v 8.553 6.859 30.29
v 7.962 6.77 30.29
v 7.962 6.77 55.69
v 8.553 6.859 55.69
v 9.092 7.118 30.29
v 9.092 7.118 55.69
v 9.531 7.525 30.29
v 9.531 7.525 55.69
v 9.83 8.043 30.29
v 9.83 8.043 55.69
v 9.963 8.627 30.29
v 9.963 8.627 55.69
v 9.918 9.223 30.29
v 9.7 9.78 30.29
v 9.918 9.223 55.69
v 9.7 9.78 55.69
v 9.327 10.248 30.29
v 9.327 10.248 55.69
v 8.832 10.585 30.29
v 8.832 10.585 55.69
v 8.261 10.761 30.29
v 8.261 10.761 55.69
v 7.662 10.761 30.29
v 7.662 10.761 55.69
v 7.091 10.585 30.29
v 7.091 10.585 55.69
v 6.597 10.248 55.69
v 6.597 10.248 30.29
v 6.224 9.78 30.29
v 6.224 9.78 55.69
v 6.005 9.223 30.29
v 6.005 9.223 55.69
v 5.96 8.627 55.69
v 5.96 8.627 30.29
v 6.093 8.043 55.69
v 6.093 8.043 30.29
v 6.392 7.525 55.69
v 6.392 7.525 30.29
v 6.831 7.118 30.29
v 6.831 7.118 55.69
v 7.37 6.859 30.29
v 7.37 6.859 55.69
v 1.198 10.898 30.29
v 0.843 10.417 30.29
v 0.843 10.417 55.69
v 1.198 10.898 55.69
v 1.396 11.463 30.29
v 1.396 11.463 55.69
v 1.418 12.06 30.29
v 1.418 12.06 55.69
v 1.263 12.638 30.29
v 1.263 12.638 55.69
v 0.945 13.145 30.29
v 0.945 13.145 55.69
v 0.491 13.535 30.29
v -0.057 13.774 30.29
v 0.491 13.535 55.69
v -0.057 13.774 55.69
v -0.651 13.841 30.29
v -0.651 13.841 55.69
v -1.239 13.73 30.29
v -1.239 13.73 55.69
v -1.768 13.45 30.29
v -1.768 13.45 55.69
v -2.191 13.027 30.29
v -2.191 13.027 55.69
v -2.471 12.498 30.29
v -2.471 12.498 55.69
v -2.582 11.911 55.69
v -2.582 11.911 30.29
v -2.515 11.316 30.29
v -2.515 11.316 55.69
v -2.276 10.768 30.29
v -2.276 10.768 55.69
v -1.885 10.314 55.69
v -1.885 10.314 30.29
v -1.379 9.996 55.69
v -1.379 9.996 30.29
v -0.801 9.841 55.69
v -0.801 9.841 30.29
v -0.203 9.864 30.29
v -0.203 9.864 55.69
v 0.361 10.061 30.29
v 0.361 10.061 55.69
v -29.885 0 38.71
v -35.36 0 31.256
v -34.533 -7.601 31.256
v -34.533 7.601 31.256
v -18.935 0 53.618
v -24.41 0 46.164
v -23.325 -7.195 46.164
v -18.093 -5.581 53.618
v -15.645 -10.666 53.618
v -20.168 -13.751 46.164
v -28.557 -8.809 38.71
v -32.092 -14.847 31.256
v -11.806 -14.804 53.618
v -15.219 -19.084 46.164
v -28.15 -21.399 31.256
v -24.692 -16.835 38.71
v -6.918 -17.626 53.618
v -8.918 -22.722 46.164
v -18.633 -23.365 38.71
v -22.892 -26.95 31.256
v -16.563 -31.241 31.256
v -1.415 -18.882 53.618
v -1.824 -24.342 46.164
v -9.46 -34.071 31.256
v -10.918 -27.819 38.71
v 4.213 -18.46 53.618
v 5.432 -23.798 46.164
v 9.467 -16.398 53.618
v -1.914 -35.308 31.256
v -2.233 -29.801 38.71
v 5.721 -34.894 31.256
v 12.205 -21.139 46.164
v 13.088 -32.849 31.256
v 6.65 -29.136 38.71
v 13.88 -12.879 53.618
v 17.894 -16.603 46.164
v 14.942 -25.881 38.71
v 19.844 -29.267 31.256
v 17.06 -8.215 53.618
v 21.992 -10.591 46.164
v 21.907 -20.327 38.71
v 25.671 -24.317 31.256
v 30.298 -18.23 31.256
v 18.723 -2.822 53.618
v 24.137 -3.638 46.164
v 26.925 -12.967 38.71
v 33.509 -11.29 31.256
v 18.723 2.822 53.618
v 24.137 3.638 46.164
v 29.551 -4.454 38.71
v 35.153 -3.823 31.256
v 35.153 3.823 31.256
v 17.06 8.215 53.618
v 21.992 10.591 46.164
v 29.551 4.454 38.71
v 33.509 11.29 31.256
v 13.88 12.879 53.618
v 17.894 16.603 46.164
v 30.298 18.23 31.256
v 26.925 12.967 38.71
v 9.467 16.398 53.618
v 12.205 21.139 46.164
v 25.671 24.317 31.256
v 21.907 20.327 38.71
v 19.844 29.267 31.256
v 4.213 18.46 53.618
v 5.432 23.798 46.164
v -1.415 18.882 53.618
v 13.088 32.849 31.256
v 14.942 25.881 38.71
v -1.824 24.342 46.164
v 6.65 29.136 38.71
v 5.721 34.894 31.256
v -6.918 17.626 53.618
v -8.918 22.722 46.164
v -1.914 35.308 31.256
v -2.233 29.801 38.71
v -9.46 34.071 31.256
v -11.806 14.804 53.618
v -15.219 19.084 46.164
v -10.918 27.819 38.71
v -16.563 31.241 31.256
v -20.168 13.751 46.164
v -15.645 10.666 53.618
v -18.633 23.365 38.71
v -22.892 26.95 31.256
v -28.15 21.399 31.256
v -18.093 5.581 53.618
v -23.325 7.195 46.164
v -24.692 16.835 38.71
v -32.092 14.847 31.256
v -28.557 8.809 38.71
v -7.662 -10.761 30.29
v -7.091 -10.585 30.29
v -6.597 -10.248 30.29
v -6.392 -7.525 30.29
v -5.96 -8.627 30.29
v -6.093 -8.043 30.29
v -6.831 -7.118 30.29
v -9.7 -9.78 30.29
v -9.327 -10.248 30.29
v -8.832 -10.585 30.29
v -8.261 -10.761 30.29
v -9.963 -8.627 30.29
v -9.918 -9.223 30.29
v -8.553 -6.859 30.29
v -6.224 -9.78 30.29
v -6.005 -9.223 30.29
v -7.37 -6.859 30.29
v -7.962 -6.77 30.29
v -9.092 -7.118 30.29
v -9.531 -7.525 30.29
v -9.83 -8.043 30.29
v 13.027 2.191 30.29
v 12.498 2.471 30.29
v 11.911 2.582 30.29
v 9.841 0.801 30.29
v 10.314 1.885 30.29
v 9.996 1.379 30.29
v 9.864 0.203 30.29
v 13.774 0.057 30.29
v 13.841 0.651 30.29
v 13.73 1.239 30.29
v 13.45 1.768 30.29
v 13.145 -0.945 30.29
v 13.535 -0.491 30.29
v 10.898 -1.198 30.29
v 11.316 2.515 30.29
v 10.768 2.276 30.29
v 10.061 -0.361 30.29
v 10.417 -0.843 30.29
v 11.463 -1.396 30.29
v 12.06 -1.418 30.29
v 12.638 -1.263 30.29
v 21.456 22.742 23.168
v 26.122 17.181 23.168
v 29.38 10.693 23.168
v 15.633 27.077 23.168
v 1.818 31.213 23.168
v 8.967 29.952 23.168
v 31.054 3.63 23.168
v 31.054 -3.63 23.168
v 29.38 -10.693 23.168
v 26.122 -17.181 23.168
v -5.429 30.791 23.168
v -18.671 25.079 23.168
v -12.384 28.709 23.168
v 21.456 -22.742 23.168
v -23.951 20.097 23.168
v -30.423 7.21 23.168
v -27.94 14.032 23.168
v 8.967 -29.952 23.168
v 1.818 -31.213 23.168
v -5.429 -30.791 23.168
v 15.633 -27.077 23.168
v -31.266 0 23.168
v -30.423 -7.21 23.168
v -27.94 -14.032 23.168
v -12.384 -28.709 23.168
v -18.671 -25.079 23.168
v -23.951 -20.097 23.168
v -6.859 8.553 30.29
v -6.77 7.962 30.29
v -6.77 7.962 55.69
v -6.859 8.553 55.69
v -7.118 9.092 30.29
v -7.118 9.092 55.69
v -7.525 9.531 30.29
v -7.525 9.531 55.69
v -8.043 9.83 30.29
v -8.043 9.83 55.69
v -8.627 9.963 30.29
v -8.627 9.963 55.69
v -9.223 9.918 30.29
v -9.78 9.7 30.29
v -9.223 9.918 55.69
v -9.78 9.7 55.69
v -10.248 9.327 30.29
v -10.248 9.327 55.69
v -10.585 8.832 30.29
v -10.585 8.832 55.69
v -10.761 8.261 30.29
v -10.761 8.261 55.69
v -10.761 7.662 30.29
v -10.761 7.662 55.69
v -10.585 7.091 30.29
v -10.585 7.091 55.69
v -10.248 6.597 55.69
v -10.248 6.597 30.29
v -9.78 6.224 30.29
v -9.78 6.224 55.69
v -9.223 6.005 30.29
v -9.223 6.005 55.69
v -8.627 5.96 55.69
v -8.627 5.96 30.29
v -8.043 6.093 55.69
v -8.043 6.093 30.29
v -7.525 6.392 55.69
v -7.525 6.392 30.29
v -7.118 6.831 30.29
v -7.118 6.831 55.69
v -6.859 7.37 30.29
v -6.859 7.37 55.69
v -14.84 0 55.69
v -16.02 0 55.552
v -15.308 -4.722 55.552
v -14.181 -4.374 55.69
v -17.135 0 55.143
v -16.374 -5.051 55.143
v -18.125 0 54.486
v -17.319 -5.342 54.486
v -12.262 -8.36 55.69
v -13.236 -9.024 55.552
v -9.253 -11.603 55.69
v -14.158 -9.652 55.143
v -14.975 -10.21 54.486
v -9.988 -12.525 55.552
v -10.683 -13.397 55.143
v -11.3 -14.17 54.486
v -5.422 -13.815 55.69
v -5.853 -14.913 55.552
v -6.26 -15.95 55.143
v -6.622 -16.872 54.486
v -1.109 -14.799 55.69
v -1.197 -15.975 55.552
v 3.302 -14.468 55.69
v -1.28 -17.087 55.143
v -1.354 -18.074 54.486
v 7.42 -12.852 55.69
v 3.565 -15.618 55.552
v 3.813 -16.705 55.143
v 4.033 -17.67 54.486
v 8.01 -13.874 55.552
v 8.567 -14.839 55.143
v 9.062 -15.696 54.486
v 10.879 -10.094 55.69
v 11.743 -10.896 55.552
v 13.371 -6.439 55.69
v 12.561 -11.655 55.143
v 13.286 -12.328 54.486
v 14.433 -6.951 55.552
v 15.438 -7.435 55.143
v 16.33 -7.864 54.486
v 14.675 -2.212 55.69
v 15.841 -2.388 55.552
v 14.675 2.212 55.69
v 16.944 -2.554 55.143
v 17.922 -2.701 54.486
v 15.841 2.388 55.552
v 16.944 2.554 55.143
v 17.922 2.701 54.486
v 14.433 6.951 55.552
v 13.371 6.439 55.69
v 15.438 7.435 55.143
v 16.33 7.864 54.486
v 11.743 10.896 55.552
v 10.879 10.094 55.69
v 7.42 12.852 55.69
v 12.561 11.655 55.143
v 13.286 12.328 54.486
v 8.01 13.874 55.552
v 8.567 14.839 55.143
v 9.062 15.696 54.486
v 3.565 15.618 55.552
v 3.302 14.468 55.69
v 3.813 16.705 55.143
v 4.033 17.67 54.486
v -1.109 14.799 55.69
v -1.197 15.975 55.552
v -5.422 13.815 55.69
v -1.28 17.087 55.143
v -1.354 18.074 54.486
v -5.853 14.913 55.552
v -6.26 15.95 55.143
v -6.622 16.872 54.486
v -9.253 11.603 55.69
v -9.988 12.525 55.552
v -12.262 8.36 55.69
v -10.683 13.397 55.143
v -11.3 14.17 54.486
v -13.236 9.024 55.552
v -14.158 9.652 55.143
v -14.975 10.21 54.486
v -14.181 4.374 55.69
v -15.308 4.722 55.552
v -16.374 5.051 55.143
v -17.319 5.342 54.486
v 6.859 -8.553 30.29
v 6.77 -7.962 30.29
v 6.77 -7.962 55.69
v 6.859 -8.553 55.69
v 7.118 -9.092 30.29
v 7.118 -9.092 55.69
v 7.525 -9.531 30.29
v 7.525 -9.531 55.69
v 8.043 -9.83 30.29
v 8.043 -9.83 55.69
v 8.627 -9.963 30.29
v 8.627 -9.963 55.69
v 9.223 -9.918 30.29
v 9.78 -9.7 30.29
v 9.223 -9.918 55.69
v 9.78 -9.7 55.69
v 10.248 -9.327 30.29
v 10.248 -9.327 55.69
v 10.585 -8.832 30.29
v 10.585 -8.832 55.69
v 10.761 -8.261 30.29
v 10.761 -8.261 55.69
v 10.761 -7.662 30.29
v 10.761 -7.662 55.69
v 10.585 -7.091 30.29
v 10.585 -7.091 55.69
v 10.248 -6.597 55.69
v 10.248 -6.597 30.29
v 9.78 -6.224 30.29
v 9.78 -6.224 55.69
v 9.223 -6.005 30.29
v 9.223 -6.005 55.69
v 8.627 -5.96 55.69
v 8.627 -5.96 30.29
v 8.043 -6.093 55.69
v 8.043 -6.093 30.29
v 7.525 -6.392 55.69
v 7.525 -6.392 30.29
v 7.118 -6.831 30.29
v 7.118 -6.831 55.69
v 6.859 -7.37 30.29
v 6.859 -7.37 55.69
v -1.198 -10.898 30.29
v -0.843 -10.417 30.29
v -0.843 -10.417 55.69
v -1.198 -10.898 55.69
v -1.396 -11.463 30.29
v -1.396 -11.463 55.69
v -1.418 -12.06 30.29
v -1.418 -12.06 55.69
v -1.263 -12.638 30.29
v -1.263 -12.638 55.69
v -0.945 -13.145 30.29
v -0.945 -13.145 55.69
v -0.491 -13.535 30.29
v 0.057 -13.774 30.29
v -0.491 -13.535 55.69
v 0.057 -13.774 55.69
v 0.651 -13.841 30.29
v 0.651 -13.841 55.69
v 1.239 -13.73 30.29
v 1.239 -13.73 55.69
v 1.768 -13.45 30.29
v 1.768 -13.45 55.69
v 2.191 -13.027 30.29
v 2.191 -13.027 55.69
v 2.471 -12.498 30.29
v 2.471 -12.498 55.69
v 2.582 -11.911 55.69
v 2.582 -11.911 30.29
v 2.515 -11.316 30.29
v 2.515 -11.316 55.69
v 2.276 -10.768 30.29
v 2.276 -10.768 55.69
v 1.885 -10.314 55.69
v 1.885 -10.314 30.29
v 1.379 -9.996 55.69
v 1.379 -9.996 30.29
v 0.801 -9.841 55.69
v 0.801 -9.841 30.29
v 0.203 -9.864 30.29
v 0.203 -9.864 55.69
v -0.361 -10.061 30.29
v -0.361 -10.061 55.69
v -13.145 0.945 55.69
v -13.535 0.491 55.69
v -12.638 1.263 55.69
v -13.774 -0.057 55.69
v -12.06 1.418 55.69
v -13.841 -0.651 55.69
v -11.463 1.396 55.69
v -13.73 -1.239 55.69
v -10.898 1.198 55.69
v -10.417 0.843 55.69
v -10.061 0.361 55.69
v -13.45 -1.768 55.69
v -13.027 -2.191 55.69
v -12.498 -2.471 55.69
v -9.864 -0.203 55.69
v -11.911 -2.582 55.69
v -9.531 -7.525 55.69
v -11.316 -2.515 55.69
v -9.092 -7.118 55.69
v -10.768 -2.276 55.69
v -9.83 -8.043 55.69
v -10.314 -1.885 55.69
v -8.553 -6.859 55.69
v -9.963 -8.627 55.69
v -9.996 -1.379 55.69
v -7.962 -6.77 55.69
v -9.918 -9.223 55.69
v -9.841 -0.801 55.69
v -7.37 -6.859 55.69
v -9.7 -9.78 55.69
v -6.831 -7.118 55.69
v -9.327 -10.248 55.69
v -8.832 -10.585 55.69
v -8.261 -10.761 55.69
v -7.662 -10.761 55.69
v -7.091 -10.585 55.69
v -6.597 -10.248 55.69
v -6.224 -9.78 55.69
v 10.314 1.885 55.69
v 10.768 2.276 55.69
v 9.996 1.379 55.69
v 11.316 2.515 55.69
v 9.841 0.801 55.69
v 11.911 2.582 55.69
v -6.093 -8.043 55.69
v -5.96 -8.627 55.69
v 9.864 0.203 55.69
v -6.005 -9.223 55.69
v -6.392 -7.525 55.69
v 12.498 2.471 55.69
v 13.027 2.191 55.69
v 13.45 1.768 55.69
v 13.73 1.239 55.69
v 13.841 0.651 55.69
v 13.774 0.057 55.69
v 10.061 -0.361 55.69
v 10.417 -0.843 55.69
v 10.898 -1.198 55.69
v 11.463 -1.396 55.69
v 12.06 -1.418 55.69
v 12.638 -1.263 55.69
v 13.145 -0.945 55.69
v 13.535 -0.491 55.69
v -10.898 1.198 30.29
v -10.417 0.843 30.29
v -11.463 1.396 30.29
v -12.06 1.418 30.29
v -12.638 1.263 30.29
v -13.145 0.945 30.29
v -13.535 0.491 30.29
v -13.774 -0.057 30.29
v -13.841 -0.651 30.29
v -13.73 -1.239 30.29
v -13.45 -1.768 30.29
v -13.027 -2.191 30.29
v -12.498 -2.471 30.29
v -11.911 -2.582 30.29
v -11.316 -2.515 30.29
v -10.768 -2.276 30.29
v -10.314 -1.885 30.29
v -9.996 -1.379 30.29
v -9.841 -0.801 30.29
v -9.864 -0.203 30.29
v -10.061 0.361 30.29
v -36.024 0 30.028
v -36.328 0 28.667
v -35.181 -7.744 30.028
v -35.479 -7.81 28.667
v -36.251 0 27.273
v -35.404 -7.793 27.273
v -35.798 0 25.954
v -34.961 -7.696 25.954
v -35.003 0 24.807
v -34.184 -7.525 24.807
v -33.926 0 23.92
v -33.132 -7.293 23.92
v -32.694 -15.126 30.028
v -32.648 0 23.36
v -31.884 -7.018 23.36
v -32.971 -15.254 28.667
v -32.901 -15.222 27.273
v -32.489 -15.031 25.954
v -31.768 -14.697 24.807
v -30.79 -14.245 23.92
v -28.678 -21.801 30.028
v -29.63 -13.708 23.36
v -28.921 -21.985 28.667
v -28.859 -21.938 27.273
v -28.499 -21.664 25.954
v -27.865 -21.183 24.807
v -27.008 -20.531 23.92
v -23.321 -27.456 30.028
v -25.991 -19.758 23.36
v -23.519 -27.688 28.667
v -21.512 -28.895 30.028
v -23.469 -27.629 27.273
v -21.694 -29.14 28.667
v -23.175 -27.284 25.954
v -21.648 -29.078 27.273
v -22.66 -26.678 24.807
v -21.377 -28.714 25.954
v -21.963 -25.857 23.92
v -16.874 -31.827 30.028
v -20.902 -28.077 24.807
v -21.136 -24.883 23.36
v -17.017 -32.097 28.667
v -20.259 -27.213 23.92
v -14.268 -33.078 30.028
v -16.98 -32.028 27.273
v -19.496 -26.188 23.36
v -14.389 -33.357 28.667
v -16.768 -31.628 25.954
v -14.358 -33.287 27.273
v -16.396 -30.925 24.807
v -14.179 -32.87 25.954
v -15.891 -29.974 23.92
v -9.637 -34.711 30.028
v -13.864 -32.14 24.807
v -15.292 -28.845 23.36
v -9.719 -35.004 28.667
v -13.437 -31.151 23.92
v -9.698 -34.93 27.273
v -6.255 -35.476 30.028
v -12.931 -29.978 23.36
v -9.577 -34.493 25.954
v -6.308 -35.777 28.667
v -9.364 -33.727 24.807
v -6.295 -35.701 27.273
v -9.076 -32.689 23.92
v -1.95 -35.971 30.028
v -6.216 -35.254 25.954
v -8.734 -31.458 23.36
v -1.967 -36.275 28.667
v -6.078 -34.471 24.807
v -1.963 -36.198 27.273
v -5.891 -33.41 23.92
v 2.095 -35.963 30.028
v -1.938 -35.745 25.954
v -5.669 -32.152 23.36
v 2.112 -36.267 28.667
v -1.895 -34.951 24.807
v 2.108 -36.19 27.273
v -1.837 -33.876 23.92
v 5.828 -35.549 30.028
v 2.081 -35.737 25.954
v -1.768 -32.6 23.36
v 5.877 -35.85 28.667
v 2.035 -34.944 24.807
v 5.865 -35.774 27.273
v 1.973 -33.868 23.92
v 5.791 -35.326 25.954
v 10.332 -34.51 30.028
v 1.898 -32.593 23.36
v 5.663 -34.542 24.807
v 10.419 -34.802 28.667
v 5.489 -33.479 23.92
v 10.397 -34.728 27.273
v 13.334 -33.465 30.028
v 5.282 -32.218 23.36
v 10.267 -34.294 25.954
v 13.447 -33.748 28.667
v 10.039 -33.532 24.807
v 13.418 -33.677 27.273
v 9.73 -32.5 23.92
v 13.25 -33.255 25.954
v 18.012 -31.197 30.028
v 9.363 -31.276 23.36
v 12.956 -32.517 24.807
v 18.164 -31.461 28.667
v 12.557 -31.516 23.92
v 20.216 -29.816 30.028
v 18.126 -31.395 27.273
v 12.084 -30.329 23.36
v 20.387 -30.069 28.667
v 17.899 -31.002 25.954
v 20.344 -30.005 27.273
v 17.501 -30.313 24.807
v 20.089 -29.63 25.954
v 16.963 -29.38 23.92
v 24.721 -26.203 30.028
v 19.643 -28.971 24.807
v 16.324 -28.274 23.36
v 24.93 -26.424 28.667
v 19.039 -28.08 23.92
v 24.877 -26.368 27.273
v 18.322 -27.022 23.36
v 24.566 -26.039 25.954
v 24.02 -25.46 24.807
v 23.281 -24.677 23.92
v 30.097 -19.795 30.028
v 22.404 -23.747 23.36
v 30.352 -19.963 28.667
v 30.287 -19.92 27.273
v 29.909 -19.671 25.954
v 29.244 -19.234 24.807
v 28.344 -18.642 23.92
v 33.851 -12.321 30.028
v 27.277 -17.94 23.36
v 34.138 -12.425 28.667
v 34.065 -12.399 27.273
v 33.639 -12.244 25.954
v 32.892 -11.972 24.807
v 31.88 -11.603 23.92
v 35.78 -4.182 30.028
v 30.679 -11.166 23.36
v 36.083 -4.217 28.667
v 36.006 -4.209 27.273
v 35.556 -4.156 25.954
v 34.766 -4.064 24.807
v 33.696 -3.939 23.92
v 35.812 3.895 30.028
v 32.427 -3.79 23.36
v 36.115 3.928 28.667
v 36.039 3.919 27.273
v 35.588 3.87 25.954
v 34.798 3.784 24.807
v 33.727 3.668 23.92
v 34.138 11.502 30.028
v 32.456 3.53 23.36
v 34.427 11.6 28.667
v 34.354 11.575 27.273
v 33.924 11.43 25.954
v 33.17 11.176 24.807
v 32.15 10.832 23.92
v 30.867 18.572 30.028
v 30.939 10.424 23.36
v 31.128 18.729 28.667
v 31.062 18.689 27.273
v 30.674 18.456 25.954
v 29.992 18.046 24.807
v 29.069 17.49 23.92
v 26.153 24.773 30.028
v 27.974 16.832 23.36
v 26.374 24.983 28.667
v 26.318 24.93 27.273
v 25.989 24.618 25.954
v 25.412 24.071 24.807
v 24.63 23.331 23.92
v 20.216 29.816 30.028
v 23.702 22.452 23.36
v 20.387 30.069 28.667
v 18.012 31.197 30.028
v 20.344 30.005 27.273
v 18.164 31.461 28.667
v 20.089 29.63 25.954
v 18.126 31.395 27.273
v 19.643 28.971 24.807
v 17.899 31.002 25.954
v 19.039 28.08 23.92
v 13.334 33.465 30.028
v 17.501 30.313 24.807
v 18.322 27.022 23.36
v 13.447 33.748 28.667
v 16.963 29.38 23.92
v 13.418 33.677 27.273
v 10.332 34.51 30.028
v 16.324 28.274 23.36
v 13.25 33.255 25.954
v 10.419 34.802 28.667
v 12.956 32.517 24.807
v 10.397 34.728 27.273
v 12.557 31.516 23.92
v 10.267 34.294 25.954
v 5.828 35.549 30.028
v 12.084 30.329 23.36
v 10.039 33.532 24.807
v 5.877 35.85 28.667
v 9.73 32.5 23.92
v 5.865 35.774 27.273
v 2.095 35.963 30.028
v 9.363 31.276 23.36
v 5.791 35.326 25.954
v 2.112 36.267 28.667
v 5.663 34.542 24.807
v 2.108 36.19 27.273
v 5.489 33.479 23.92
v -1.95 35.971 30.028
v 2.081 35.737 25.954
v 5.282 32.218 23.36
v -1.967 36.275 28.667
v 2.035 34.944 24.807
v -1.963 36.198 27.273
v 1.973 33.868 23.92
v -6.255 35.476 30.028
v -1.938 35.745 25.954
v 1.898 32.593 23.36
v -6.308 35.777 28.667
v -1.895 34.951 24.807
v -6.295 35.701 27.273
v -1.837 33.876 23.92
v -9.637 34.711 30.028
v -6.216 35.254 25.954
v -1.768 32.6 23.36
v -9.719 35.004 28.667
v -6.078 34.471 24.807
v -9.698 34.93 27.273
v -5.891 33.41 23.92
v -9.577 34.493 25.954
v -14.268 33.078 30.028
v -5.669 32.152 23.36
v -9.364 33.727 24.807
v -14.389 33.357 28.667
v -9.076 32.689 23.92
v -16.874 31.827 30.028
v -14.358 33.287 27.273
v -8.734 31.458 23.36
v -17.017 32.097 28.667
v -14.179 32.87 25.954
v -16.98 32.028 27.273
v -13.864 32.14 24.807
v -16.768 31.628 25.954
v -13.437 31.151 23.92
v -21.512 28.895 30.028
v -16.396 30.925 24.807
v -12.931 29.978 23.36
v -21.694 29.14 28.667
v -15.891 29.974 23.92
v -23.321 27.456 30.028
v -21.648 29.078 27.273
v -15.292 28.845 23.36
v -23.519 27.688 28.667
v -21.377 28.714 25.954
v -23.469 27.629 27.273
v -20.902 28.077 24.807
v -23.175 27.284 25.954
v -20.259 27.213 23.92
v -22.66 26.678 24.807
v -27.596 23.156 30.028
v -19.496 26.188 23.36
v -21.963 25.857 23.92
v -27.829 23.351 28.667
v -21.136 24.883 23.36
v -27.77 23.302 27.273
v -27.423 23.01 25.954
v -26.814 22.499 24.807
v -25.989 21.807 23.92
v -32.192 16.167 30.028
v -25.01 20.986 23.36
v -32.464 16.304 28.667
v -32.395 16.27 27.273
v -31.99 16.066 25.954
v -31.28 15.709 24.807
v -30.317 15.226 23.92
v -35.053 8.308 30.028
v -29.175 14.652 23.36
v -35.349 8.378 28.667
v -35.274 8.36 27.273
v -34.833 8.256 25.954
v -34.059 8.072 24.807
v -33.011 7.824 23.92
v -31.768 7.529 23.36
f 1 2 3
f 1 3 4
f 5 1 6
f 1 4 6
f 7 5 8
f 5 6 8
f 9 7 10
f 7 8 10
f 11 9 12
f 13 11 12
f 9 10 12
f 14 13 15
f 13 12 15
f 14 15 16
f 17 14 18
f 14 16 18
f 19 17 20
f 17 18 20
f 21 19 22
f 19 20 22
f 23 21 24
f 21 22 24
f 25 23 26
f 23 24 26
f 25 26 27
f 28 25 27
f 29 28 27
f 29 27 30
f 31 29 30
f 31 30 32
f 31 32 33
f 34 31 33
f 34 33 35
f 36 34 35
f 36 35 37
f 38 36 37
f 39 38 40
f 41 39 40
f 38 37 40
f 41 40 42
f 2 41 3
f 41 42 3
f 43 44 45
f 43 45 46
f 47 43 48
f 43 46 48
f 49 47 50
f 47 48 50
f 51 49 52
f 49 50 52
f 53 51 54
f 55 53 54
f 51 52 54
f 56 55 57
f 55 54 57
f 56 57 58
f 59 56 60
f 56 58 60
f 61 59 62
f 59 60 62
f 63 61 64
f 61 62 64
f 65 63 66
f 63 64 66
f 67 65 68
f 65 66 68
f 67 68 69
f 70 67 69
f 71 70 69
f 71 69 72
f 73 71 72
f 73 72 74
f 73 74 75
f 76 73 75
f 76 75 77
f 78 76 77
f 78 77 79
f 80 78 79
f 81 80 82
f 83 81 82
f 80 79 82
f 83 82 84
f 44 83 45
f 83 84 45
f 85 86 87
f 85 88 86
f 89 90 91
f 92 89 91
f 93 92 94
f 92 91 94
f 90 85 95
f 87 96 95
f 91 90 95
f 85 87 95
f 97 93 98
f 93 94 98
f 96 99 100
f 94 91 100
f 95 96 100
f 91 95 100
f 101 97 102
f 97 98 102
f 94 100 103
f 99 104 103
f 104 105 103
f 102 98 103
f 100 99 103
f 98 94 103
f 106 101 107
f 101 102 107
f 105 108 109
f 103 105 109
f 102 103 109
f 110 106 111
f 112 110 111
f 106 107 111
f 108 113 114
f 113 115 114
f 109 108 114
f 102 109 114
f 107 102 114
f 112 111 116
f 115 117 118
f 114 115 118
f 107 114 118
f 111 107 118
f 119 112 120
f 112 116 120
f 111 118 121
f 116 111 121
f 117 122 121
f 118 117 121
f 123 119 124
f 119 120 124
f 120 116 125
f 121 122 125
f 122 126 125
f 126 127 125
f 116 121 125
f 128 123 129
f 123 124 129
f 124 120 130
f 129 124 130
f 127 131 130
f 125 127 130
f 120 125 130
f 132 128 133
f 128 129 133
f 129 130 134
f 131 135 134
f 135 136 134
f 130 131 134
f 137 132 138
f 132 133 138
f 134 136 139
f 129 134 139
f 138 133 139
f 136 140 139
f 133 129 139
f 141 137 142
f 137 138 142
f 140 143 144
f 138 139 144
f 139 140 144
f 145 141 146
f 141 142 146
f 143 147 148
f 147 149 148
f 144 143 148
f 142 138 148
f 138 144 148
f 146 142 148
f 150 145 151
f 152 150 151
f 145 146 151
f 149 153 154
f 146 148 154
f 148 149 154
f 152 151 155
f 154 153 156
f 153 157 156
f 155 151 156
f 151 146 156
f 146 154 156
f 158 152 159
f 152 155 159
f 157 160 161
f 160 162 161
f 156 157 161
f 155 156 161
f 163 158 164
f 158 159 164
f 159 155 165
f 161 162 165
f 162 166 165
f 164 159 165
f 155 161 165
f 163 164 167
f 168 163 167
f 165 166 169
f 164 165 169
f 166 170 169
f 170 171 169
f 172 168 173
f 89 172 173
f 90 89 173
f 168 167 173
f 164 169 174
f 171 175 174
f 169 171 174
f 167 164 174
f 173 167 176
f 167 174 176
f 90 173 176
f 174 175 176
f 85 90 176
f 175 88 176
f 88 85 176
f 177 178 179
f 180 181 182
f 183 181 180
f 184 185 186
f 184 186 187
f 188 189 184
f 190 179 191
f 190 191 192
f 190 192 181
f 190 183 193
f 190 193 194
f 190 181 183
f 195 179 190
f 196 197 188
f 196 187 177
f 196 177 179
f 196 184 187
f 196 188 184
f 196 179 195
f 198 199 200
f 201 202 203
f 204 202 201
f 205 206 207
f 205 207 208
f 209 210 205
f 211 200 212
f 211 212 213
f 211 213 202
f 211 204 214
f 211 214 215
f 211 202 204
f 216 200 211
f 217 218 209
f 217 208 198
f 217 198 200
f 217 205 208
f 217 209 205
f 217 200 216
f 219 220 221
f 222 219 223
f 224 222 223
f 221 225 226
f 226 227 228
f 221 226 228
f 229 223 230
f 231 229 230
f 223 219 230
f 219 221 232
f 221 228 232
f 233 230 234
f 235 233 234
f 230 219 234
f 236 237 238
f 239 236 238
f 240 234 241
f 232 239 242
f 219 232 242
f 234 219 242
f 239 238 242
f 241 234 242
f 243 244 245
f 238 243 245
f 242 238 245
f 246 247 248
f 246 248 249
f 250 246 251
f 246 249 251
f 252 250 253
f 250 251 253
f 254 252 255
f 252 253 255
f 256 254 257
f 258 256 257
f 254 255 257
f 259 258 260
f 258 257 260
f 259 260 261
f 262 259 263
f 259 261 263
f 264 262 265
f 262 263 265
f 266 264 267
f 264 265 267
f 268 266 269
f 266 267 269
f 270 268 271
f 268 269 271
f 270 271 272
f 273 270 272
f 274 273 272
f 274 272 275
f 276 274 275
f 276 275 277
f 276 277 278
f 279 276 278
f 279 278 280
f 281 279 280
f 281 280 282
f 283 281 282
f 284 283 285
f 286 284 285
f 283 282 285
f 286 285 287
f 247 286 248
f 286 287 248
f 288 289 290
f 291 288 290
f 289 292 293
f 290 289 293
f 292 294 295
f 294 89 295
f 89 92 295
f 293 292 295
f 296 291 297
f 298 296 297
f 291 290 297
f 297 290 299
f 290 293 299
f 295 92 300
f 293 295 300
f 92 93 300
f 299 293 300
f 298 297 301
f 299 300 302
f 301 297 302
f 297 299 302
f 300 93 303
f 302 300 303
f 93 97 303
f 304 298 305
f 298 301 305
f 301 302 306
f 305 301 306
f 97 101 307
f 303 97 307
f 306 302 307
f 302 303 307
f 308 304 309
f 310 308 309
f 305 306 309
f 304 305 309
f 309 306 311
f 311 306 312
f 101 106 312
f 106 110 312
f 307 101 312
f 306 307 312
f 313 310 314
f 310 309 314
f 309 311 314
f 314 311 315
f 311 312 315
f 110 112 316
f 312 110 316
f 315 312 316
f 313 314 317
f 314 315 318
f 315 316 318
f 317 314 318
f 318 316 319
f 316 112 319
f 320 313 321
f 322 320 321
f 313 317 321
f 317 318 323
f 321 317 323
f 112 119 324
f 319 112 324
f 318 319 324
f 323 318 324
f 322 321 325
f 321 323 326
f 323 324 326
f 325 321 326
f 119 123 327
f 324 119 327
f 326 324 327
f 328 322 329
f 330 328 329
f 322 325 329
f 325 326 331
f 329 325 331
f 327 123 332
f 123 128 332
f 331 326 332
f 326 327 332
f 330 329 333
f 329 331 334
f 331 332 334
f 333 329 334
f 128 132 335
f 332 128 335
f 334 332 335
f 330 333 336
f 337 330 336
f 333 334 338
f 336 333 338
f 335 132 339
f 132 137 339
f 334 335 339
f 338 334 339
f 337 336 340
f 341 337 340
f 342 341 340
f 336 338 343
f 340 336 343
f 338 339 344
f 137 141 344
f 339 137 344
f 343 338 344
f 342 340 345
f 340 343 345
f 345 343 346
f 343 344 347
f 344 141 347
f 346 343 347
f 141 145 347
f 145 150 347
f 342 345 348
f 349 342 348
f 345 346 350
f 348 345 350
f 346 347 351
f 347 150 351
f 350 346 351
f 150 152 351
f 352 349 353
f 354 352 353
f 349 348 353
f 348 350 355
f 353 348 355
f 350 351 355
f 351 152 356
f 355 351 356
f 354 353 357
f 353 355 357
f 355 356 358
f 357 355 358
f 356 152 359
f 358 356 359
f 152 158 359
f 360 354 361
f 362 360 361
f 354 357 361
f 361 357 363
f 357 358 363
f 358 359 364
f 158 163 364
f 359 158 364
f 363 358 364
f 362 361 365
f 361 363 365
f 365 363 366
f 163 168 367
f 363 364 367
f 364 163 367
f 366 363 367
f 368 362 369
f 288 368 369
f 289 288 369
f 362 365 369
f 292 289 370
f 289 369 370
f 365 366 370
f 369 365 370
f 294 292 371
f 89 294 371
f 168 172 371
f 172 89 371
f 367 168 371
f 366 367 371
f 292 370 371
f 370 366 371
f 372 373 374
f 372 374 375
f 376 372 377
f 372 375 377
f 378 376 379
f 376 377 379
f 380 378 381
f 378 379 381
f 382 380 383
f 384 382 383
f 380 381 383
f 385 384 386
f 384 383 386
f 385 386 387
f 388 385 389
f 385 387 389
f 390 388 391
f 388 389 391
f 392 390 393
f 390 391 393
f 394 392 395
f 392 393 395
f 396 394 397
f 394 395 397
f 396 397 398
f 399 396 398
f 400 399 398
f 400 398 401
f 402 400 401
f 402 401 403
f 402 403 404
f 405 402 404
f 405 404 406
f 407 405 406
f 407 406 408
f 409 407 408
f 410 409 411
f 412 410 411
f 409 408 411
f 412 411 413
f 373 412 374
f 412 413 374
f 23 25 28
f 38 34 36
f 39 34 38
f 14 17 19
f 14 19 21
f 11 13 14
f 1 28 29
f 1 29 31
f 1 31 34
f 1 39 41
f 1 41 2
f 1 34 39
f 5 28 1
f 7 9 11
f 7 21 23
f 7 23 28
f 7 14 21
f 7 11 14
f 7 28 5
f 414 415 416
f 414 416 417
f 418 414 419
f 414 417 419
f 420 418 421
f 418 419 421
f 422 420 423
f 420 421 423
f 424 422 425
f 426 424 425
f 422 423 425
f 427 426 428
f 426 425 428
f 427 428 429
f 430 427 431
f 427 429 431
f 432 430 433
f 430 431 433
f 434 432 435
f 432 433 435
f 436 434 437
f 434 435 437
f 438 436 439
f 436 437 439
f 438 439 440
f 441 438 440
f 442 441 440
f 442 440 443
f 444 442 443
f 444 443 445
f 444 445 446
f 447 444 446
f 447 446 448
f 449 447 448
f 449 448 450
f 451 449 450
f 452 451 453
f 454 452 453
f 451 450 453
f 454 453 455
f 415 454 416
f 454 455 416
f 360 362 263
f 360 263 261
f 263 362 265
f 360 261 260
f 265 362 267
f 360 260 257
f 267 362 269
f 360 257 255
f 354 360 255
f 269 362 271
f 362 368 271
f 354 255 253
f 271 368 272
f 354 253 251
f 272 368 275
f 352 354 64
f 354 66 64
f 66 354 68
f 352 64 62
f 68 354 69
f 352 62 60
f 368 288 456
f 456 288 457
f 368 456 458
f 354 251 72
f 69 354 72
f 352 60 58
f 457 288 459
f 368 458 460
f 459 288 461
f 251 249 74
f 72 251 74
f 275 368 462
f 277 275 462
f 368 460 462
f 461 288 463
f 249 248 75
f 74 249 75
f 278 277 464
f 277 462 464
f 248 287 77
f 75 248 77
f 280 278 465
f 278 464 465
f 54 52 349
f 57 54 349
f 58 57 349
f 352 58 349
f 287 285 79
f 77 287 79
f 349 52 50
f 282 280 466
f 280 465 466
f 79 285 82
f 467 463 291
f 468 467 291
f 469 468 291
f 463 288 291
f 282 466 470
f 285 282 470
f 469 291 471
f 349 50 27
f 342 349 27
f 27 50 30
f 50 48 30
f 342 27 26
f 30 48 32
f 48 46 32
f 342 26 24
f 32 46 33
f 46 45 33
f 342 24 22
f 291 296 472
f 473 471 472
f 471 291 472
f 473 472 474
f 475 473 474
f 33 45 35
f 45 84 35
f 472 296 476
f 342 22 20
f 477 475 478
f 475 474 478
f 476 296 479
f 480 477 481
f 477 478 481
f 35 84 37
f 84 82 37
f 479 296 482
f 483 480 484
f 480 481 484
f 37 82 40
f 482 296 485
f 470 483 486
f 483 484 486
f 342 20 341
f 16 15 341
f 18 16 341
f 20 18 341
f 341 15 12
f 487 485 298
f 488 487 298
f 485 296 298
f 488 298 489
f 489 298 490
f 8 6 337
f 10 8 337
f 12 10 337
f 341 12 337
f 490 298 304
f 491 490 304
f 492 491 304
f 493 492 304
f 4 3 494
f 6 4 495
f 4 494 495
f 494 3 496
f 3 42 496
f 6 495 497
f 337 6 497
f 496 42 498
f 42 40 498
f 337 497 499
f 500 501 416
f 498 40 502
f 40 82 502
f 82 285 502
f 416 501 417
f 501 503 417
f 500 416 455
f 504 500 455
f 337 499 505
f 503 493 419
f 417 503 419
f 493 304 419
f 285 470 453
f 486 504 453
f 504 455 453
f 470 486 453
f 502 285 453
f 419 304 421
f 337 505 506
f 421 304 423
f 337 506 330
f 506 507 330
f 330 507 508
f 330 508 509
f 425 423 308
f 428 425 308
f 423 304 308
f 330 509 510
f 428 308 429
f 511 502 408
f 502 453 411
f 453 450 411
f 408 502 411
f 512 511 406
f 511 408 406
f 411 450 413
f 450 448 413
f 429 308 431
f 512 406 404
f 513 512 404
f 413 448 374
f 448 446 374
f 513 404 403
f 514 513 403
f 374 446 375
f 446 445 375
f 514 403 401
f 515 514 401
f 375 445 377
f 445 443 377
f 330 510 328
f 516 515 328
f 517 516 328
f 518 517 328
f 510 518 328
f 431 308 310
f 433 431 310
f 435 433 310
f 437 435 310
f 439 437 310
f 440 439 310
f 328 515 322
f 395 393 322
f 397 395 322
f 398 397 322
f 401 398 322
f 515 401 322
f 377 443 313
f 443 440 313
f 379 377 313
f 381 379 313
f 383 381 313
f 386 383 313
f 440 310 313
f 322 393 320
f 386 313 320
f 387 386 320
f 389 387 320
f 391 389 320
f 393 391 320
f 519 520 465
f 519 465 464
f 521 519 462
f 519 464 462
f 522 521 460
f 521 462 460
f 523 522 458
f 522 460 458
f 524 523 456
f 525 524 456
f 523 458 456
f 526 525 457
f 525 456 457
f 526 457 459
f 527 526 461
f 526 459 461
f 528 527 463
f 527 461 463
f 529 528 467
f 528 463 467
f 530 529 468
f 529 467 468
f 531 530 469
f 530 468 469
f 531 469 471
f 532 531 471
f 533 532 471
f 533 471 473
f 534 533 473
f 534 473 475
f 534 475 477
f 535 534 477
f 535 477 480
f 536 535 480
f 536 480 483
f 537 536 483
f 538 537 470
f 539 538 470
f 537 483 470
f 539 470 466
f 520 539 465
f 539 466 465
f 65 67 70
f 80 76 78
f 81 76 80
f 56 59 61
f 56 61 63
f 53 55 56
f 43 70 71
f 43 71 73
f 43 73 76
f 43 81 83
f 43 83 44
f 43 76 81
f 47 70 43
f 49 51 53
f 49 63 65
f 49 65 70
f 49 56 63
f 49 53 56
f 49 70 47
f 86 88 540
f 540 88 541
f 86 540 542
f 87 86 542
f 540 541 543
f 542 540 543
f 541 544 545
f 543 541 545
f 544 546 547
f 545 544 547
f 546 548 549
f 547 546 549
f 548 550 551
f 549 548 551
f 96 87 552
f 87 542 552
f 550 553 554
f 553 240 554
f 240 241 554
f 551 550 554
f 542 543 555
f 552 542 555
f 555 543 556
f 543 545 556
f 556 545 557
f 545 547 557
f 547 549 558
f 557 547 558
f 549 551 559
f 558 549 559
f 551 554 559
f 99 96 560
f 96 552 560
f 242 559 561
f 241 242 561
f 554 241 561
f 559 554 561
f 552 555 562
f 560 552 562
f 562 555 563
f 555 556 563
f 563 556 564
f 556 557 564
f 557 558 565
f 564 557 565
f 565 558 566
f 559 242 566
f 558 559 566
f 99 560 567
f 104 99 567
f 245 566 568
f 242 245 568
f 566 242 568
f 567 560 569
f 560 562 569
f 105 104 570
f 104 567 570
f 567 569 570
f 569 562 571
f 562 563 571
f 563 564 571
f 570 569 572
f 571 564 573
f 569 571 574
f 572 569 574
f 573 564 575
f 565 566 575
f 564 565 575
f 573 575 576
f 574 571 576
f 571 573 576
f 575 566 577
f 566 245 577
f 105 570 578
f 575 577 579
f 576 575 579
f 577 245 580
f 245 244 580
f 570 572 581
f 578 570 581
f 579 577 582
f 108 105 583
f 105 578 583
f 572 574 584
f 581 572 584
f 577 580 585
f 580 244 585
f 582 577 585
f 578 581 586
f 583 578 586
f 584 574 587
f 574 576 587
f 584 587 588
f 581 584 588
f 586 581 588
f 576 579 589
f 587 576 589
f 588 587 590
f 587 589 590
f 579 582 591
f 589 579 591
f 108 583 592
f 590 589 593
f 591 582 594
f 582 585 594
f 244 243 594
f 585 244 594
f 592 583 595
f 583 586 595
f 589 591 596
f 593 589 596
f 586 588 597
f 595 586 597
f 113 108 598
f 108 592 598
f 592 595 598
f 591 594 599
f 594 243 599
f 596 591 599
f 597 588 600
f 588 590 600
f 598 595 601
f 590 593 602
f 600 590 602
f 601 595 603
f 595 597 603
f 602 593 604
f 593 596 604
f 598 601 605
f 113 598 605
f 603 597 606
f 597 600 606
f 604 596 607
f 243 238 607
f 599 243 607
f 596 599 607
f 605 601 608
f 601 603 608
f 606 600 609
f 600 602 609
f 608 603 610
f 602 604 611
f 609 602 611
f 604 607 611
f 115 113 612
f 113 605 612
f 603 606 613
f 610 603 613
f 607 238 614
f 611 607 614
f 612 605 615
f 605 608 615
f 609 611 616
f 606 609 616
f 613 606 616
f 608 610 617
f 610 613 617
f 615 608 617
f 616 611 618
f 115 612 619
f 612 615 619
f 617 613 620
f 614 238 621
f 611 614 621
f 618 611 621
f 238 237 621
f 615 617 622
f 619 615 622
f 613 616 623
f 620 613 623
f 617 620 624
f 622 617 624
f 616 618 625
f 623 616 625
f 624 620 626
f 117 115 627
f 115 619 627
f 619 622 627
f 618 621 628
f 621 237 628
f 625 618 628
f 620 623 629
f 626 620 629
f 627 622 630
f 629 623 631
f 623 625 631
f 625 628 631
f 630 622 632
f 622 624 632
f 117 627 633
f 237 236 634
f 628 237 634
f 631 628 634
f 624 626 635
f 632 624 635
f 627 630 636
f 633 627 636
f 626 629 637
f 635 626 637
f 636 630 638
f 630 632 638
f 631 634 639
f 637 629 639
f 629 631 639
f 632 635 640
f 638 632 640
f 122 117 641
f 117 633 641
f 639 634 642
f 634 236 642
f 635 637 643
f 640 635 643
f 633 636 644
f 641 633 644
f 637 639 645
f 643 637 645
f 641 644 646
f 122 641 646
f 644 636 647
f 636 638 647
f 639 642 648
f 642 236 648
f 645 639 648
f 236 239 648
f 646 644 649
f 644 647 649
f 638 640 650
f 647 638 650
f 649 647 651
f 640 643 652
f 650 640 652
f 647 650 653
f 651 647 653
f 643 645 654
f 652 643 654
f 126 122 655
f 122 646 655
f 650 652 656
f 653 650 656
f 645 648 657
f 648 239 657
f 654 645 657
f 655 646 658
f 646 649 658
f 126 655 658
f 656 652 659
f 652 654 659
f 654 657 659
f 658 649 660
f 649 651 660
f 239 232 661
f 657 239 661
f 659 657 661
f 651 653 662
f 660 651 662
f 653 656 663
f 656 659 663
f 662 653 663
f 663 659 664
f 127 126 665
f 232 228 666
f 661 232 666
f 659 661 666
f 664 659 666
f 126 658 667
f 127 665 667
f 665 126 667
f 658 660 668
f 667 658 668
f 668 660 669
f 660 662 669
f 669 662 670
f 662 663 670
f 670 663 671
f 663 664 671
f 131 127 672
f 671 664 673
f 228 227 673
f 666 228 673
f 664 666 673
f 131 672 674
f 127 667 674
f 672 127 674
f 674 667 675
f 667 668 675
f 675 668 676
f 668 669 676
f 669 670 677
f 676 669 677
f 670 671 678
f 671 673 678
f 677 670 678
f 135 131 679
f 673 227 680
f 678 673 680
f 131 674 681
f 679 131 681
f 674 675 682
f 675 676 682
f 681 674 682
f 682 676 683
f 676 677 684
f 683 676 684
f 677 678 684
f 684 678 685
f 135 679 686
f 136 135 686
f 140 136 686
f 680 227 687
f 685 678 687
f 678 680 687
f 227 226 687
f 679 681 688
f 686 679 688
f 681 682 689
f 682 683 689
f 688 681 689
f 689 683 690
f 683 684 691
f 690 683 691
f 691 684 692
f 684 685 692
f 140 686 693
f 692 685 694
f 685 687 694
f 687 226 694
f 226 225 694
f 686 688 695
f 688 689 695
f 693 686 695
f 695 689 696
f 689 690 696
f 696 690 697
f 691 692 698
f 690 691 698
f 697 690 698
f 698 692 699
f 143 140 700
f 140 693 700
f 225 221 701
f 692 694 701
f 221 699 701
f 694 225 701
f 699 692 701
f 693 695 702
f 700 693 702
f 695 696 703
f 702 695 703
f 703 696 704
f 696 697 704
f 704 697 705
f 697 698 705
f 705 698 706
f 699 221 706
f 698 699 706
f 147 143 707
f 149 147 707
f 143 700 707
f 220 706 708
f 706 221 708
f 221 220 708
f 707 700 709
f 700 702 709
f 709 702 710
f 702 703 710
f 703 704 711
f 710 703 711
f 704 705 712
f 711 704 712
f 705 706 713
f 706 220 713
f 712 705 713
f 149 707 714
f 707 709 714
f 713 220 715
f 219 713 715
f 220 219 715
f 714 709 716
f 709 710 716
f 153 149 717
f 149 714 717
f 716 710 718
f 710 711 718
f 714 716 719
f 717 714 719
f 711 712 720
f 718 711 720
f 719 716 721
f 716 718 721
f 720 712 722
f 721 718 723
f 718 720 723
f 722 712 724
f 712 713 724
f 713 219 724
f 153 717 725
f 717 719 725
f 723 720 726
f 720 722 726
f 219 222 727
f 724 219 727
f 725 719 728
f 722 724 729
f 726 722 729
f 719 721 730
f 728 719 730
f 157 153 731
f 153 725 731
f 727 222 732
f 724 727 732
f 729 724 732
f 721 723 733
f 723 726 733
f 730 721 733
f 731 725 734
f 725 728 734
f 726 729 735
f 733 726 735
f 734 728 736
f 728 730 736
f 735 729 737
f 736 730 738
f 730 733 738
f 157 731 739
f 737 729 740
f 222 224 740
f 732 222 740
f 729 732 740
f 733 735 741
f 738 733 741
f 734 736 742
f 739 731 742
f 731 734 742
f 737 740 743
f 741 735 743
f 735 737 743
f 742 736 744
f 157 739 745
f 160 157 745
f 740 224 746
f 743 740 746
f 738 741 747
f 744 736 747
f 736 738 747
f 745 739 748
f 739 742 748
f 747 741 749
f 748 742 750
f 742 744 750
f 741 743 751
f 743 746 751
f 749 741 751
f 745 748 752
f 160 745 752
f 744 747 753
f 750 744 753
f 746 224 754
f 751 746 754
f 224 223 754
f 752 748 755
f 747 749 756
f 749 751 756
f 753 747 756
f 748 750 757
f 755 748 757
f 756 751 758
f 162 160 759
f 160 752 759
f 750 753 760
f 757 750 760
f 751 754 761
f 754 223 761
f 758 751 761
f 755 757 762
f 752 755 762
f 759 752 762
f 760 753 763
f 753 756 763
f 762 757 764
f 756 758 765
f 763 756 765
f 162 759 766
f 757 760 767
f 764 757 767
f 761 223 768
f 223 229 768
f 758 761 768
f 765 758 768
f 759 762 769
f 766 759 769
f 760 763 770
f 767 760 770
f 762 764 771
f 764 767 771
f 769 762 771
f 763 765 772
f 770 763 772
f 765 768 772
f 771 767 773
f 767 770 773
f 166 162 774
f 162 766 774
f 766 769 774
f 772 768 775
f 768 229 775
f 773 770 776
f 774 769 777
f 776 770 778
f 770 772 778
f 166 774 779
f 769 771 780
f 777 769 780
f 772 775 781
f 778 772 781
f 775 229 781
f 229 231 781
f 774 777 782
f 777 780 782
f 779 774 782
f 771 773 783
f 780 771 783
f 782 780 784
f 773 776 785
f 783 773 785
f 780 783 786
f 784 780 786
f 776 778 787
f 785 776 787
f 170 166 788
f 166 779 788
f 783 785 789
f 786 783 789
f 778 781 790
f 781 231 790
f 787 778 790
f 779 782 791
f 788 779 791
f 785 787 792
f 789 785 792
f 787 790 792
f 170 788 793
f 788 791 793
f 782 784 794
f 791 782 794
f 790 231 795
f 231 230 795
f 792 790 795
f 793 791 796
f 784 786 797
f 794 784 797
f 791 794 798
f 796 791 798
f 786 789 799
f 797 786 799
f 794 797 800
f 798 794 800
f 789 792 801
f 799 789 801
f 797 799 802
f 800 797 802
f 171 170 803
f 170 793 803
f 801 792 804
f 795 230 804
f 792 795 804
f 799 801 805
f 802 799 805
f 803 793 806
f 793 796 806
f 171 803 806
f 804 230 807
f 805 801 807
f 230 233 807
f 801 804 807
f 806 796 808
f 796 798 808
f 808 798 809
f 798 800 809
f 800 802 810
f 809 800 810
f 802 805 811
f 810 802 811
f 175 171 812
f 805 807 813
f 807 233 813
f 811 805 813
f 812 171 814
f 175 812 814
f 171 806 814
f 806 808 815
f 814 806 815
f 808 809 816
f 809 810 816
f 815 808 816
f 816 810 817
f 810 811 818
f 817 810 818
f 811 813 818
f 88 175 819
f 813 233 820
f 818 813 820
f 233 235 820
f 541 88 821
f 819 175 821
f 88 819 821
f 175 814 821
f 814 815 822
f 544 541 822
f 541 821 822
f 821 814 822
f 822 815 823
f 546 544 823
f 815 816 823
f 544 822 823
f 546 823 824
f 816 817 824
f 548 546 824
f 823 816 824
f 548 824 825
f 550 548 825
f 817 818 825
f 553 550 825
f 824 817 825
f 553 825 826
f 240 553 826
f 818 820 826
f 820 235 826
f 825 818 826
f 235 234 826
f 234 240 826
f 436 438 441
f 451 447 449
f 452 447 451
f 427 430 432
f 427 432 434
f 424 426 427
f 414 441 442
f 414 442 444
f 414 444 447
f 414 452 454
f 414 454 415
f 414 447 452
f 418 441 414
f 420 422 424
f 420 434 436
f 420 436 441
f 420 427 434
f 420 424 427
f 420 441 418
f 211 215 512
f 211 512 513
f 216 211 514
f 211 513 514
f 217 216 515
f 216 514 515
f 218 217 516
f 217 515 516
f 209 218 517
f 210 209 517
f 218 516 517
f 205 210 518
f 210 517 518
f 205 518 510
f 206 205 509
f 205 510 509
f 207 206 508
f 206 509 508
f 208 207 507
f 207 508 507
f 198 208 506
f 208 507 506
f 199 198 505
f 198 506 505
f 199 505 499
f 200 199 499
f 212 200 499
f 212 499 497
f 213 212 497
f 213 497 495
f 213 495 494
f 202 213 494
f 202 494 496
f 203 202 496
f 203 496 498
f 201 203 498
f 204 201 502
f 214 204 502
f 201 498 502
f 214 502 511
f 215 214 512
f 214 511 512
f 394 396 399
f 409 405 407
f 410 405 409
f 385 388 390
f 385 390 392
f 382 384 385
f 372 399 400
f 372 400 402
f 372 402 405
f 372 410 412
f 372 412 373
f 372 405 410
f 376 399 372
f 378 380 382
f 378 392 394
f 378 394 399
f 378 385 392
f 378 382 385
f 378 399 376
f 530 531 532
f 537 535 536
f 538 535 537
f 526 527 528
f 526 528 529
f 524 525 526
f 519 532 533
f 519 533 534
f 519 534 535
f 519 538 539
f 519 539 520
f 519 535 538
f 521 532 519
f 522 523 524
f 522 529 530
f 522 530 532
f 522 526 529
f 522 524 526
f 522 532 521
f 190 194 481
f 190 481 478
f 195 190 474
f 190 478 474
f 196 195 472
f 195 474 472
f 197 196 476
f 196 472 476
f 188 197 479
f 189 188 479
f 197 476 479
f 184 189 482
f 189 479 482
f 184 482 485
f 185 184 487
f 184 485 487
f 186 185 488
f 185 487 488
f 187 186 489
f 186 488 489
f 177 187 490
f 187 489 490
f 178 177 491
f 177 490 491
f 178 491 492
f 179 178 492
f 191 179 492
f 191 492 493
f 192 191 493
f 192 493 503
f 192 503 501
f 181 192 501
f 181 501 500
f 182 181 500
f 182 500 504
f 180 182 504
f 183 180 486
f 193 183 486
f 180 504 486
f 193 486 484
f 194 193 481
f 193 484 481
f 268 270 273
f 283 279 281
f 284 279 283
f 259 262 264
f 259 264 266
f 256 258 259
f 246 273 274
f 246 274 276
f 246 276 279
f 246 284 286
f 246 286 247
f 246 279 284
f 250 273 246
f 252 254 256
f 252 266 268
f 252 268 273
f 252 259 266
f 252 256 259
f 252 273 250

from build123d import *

# Parameters (mm, degrees)
F2_R            = 5.08
F3_R            = 2.006915686
F4_DEPTH        = 25.4
F4_COPIES_COUNT = 8


# Not quite as in the source:
# - a pattern or mirror of a feature is missing from the dataset's text; its kind, count and spacing are read off the source's solid


with BuildPart() as f1:
    # F0 (on Front) → F1 (revolve)
    with BuildSketch(Plane.XZ):
        Polygon((0, 23.1683626771), (0, 55.6904152036), (-17.4122489989, 55.6904152036), (-41.3001254201, 23.1683626771), align=None)
    revolve(axis=Axis((0, 0, 39.4293889403), (0, 0, 1)))

    # F2
    f2_edges = [f1.edges().sort_by_distance(p)[0] for p in [
        (41.300125, 0, 23.168363),
        (17.412249, 0, 55.690415),
    ]]
    fillet(f2_edges, radius=F2_R)

    # F3 (on face) → F4 (cut)
    with BuildSketch(Plane.XY.offset(55.6904152036)):
        with Locations((-8.7765334174, 7.9615563154)):
            Circle(F3_R)
    f4 = extrude(amount=-F4_DEPTH, mode=Mode.SUBTRACT)

    # F4_copies: F4 ×8 about axis
    f4_copies_axis = Axis((0, 0, 0), (0, 0, 1))
    for i in range(1, F4_COPIES_COUNT):
        add(f4.rotate(f4_copies_axis, i * 360 / F4_COPIES_COUNT), mode=Mode.SUBTRACT)


solid = f1.part
